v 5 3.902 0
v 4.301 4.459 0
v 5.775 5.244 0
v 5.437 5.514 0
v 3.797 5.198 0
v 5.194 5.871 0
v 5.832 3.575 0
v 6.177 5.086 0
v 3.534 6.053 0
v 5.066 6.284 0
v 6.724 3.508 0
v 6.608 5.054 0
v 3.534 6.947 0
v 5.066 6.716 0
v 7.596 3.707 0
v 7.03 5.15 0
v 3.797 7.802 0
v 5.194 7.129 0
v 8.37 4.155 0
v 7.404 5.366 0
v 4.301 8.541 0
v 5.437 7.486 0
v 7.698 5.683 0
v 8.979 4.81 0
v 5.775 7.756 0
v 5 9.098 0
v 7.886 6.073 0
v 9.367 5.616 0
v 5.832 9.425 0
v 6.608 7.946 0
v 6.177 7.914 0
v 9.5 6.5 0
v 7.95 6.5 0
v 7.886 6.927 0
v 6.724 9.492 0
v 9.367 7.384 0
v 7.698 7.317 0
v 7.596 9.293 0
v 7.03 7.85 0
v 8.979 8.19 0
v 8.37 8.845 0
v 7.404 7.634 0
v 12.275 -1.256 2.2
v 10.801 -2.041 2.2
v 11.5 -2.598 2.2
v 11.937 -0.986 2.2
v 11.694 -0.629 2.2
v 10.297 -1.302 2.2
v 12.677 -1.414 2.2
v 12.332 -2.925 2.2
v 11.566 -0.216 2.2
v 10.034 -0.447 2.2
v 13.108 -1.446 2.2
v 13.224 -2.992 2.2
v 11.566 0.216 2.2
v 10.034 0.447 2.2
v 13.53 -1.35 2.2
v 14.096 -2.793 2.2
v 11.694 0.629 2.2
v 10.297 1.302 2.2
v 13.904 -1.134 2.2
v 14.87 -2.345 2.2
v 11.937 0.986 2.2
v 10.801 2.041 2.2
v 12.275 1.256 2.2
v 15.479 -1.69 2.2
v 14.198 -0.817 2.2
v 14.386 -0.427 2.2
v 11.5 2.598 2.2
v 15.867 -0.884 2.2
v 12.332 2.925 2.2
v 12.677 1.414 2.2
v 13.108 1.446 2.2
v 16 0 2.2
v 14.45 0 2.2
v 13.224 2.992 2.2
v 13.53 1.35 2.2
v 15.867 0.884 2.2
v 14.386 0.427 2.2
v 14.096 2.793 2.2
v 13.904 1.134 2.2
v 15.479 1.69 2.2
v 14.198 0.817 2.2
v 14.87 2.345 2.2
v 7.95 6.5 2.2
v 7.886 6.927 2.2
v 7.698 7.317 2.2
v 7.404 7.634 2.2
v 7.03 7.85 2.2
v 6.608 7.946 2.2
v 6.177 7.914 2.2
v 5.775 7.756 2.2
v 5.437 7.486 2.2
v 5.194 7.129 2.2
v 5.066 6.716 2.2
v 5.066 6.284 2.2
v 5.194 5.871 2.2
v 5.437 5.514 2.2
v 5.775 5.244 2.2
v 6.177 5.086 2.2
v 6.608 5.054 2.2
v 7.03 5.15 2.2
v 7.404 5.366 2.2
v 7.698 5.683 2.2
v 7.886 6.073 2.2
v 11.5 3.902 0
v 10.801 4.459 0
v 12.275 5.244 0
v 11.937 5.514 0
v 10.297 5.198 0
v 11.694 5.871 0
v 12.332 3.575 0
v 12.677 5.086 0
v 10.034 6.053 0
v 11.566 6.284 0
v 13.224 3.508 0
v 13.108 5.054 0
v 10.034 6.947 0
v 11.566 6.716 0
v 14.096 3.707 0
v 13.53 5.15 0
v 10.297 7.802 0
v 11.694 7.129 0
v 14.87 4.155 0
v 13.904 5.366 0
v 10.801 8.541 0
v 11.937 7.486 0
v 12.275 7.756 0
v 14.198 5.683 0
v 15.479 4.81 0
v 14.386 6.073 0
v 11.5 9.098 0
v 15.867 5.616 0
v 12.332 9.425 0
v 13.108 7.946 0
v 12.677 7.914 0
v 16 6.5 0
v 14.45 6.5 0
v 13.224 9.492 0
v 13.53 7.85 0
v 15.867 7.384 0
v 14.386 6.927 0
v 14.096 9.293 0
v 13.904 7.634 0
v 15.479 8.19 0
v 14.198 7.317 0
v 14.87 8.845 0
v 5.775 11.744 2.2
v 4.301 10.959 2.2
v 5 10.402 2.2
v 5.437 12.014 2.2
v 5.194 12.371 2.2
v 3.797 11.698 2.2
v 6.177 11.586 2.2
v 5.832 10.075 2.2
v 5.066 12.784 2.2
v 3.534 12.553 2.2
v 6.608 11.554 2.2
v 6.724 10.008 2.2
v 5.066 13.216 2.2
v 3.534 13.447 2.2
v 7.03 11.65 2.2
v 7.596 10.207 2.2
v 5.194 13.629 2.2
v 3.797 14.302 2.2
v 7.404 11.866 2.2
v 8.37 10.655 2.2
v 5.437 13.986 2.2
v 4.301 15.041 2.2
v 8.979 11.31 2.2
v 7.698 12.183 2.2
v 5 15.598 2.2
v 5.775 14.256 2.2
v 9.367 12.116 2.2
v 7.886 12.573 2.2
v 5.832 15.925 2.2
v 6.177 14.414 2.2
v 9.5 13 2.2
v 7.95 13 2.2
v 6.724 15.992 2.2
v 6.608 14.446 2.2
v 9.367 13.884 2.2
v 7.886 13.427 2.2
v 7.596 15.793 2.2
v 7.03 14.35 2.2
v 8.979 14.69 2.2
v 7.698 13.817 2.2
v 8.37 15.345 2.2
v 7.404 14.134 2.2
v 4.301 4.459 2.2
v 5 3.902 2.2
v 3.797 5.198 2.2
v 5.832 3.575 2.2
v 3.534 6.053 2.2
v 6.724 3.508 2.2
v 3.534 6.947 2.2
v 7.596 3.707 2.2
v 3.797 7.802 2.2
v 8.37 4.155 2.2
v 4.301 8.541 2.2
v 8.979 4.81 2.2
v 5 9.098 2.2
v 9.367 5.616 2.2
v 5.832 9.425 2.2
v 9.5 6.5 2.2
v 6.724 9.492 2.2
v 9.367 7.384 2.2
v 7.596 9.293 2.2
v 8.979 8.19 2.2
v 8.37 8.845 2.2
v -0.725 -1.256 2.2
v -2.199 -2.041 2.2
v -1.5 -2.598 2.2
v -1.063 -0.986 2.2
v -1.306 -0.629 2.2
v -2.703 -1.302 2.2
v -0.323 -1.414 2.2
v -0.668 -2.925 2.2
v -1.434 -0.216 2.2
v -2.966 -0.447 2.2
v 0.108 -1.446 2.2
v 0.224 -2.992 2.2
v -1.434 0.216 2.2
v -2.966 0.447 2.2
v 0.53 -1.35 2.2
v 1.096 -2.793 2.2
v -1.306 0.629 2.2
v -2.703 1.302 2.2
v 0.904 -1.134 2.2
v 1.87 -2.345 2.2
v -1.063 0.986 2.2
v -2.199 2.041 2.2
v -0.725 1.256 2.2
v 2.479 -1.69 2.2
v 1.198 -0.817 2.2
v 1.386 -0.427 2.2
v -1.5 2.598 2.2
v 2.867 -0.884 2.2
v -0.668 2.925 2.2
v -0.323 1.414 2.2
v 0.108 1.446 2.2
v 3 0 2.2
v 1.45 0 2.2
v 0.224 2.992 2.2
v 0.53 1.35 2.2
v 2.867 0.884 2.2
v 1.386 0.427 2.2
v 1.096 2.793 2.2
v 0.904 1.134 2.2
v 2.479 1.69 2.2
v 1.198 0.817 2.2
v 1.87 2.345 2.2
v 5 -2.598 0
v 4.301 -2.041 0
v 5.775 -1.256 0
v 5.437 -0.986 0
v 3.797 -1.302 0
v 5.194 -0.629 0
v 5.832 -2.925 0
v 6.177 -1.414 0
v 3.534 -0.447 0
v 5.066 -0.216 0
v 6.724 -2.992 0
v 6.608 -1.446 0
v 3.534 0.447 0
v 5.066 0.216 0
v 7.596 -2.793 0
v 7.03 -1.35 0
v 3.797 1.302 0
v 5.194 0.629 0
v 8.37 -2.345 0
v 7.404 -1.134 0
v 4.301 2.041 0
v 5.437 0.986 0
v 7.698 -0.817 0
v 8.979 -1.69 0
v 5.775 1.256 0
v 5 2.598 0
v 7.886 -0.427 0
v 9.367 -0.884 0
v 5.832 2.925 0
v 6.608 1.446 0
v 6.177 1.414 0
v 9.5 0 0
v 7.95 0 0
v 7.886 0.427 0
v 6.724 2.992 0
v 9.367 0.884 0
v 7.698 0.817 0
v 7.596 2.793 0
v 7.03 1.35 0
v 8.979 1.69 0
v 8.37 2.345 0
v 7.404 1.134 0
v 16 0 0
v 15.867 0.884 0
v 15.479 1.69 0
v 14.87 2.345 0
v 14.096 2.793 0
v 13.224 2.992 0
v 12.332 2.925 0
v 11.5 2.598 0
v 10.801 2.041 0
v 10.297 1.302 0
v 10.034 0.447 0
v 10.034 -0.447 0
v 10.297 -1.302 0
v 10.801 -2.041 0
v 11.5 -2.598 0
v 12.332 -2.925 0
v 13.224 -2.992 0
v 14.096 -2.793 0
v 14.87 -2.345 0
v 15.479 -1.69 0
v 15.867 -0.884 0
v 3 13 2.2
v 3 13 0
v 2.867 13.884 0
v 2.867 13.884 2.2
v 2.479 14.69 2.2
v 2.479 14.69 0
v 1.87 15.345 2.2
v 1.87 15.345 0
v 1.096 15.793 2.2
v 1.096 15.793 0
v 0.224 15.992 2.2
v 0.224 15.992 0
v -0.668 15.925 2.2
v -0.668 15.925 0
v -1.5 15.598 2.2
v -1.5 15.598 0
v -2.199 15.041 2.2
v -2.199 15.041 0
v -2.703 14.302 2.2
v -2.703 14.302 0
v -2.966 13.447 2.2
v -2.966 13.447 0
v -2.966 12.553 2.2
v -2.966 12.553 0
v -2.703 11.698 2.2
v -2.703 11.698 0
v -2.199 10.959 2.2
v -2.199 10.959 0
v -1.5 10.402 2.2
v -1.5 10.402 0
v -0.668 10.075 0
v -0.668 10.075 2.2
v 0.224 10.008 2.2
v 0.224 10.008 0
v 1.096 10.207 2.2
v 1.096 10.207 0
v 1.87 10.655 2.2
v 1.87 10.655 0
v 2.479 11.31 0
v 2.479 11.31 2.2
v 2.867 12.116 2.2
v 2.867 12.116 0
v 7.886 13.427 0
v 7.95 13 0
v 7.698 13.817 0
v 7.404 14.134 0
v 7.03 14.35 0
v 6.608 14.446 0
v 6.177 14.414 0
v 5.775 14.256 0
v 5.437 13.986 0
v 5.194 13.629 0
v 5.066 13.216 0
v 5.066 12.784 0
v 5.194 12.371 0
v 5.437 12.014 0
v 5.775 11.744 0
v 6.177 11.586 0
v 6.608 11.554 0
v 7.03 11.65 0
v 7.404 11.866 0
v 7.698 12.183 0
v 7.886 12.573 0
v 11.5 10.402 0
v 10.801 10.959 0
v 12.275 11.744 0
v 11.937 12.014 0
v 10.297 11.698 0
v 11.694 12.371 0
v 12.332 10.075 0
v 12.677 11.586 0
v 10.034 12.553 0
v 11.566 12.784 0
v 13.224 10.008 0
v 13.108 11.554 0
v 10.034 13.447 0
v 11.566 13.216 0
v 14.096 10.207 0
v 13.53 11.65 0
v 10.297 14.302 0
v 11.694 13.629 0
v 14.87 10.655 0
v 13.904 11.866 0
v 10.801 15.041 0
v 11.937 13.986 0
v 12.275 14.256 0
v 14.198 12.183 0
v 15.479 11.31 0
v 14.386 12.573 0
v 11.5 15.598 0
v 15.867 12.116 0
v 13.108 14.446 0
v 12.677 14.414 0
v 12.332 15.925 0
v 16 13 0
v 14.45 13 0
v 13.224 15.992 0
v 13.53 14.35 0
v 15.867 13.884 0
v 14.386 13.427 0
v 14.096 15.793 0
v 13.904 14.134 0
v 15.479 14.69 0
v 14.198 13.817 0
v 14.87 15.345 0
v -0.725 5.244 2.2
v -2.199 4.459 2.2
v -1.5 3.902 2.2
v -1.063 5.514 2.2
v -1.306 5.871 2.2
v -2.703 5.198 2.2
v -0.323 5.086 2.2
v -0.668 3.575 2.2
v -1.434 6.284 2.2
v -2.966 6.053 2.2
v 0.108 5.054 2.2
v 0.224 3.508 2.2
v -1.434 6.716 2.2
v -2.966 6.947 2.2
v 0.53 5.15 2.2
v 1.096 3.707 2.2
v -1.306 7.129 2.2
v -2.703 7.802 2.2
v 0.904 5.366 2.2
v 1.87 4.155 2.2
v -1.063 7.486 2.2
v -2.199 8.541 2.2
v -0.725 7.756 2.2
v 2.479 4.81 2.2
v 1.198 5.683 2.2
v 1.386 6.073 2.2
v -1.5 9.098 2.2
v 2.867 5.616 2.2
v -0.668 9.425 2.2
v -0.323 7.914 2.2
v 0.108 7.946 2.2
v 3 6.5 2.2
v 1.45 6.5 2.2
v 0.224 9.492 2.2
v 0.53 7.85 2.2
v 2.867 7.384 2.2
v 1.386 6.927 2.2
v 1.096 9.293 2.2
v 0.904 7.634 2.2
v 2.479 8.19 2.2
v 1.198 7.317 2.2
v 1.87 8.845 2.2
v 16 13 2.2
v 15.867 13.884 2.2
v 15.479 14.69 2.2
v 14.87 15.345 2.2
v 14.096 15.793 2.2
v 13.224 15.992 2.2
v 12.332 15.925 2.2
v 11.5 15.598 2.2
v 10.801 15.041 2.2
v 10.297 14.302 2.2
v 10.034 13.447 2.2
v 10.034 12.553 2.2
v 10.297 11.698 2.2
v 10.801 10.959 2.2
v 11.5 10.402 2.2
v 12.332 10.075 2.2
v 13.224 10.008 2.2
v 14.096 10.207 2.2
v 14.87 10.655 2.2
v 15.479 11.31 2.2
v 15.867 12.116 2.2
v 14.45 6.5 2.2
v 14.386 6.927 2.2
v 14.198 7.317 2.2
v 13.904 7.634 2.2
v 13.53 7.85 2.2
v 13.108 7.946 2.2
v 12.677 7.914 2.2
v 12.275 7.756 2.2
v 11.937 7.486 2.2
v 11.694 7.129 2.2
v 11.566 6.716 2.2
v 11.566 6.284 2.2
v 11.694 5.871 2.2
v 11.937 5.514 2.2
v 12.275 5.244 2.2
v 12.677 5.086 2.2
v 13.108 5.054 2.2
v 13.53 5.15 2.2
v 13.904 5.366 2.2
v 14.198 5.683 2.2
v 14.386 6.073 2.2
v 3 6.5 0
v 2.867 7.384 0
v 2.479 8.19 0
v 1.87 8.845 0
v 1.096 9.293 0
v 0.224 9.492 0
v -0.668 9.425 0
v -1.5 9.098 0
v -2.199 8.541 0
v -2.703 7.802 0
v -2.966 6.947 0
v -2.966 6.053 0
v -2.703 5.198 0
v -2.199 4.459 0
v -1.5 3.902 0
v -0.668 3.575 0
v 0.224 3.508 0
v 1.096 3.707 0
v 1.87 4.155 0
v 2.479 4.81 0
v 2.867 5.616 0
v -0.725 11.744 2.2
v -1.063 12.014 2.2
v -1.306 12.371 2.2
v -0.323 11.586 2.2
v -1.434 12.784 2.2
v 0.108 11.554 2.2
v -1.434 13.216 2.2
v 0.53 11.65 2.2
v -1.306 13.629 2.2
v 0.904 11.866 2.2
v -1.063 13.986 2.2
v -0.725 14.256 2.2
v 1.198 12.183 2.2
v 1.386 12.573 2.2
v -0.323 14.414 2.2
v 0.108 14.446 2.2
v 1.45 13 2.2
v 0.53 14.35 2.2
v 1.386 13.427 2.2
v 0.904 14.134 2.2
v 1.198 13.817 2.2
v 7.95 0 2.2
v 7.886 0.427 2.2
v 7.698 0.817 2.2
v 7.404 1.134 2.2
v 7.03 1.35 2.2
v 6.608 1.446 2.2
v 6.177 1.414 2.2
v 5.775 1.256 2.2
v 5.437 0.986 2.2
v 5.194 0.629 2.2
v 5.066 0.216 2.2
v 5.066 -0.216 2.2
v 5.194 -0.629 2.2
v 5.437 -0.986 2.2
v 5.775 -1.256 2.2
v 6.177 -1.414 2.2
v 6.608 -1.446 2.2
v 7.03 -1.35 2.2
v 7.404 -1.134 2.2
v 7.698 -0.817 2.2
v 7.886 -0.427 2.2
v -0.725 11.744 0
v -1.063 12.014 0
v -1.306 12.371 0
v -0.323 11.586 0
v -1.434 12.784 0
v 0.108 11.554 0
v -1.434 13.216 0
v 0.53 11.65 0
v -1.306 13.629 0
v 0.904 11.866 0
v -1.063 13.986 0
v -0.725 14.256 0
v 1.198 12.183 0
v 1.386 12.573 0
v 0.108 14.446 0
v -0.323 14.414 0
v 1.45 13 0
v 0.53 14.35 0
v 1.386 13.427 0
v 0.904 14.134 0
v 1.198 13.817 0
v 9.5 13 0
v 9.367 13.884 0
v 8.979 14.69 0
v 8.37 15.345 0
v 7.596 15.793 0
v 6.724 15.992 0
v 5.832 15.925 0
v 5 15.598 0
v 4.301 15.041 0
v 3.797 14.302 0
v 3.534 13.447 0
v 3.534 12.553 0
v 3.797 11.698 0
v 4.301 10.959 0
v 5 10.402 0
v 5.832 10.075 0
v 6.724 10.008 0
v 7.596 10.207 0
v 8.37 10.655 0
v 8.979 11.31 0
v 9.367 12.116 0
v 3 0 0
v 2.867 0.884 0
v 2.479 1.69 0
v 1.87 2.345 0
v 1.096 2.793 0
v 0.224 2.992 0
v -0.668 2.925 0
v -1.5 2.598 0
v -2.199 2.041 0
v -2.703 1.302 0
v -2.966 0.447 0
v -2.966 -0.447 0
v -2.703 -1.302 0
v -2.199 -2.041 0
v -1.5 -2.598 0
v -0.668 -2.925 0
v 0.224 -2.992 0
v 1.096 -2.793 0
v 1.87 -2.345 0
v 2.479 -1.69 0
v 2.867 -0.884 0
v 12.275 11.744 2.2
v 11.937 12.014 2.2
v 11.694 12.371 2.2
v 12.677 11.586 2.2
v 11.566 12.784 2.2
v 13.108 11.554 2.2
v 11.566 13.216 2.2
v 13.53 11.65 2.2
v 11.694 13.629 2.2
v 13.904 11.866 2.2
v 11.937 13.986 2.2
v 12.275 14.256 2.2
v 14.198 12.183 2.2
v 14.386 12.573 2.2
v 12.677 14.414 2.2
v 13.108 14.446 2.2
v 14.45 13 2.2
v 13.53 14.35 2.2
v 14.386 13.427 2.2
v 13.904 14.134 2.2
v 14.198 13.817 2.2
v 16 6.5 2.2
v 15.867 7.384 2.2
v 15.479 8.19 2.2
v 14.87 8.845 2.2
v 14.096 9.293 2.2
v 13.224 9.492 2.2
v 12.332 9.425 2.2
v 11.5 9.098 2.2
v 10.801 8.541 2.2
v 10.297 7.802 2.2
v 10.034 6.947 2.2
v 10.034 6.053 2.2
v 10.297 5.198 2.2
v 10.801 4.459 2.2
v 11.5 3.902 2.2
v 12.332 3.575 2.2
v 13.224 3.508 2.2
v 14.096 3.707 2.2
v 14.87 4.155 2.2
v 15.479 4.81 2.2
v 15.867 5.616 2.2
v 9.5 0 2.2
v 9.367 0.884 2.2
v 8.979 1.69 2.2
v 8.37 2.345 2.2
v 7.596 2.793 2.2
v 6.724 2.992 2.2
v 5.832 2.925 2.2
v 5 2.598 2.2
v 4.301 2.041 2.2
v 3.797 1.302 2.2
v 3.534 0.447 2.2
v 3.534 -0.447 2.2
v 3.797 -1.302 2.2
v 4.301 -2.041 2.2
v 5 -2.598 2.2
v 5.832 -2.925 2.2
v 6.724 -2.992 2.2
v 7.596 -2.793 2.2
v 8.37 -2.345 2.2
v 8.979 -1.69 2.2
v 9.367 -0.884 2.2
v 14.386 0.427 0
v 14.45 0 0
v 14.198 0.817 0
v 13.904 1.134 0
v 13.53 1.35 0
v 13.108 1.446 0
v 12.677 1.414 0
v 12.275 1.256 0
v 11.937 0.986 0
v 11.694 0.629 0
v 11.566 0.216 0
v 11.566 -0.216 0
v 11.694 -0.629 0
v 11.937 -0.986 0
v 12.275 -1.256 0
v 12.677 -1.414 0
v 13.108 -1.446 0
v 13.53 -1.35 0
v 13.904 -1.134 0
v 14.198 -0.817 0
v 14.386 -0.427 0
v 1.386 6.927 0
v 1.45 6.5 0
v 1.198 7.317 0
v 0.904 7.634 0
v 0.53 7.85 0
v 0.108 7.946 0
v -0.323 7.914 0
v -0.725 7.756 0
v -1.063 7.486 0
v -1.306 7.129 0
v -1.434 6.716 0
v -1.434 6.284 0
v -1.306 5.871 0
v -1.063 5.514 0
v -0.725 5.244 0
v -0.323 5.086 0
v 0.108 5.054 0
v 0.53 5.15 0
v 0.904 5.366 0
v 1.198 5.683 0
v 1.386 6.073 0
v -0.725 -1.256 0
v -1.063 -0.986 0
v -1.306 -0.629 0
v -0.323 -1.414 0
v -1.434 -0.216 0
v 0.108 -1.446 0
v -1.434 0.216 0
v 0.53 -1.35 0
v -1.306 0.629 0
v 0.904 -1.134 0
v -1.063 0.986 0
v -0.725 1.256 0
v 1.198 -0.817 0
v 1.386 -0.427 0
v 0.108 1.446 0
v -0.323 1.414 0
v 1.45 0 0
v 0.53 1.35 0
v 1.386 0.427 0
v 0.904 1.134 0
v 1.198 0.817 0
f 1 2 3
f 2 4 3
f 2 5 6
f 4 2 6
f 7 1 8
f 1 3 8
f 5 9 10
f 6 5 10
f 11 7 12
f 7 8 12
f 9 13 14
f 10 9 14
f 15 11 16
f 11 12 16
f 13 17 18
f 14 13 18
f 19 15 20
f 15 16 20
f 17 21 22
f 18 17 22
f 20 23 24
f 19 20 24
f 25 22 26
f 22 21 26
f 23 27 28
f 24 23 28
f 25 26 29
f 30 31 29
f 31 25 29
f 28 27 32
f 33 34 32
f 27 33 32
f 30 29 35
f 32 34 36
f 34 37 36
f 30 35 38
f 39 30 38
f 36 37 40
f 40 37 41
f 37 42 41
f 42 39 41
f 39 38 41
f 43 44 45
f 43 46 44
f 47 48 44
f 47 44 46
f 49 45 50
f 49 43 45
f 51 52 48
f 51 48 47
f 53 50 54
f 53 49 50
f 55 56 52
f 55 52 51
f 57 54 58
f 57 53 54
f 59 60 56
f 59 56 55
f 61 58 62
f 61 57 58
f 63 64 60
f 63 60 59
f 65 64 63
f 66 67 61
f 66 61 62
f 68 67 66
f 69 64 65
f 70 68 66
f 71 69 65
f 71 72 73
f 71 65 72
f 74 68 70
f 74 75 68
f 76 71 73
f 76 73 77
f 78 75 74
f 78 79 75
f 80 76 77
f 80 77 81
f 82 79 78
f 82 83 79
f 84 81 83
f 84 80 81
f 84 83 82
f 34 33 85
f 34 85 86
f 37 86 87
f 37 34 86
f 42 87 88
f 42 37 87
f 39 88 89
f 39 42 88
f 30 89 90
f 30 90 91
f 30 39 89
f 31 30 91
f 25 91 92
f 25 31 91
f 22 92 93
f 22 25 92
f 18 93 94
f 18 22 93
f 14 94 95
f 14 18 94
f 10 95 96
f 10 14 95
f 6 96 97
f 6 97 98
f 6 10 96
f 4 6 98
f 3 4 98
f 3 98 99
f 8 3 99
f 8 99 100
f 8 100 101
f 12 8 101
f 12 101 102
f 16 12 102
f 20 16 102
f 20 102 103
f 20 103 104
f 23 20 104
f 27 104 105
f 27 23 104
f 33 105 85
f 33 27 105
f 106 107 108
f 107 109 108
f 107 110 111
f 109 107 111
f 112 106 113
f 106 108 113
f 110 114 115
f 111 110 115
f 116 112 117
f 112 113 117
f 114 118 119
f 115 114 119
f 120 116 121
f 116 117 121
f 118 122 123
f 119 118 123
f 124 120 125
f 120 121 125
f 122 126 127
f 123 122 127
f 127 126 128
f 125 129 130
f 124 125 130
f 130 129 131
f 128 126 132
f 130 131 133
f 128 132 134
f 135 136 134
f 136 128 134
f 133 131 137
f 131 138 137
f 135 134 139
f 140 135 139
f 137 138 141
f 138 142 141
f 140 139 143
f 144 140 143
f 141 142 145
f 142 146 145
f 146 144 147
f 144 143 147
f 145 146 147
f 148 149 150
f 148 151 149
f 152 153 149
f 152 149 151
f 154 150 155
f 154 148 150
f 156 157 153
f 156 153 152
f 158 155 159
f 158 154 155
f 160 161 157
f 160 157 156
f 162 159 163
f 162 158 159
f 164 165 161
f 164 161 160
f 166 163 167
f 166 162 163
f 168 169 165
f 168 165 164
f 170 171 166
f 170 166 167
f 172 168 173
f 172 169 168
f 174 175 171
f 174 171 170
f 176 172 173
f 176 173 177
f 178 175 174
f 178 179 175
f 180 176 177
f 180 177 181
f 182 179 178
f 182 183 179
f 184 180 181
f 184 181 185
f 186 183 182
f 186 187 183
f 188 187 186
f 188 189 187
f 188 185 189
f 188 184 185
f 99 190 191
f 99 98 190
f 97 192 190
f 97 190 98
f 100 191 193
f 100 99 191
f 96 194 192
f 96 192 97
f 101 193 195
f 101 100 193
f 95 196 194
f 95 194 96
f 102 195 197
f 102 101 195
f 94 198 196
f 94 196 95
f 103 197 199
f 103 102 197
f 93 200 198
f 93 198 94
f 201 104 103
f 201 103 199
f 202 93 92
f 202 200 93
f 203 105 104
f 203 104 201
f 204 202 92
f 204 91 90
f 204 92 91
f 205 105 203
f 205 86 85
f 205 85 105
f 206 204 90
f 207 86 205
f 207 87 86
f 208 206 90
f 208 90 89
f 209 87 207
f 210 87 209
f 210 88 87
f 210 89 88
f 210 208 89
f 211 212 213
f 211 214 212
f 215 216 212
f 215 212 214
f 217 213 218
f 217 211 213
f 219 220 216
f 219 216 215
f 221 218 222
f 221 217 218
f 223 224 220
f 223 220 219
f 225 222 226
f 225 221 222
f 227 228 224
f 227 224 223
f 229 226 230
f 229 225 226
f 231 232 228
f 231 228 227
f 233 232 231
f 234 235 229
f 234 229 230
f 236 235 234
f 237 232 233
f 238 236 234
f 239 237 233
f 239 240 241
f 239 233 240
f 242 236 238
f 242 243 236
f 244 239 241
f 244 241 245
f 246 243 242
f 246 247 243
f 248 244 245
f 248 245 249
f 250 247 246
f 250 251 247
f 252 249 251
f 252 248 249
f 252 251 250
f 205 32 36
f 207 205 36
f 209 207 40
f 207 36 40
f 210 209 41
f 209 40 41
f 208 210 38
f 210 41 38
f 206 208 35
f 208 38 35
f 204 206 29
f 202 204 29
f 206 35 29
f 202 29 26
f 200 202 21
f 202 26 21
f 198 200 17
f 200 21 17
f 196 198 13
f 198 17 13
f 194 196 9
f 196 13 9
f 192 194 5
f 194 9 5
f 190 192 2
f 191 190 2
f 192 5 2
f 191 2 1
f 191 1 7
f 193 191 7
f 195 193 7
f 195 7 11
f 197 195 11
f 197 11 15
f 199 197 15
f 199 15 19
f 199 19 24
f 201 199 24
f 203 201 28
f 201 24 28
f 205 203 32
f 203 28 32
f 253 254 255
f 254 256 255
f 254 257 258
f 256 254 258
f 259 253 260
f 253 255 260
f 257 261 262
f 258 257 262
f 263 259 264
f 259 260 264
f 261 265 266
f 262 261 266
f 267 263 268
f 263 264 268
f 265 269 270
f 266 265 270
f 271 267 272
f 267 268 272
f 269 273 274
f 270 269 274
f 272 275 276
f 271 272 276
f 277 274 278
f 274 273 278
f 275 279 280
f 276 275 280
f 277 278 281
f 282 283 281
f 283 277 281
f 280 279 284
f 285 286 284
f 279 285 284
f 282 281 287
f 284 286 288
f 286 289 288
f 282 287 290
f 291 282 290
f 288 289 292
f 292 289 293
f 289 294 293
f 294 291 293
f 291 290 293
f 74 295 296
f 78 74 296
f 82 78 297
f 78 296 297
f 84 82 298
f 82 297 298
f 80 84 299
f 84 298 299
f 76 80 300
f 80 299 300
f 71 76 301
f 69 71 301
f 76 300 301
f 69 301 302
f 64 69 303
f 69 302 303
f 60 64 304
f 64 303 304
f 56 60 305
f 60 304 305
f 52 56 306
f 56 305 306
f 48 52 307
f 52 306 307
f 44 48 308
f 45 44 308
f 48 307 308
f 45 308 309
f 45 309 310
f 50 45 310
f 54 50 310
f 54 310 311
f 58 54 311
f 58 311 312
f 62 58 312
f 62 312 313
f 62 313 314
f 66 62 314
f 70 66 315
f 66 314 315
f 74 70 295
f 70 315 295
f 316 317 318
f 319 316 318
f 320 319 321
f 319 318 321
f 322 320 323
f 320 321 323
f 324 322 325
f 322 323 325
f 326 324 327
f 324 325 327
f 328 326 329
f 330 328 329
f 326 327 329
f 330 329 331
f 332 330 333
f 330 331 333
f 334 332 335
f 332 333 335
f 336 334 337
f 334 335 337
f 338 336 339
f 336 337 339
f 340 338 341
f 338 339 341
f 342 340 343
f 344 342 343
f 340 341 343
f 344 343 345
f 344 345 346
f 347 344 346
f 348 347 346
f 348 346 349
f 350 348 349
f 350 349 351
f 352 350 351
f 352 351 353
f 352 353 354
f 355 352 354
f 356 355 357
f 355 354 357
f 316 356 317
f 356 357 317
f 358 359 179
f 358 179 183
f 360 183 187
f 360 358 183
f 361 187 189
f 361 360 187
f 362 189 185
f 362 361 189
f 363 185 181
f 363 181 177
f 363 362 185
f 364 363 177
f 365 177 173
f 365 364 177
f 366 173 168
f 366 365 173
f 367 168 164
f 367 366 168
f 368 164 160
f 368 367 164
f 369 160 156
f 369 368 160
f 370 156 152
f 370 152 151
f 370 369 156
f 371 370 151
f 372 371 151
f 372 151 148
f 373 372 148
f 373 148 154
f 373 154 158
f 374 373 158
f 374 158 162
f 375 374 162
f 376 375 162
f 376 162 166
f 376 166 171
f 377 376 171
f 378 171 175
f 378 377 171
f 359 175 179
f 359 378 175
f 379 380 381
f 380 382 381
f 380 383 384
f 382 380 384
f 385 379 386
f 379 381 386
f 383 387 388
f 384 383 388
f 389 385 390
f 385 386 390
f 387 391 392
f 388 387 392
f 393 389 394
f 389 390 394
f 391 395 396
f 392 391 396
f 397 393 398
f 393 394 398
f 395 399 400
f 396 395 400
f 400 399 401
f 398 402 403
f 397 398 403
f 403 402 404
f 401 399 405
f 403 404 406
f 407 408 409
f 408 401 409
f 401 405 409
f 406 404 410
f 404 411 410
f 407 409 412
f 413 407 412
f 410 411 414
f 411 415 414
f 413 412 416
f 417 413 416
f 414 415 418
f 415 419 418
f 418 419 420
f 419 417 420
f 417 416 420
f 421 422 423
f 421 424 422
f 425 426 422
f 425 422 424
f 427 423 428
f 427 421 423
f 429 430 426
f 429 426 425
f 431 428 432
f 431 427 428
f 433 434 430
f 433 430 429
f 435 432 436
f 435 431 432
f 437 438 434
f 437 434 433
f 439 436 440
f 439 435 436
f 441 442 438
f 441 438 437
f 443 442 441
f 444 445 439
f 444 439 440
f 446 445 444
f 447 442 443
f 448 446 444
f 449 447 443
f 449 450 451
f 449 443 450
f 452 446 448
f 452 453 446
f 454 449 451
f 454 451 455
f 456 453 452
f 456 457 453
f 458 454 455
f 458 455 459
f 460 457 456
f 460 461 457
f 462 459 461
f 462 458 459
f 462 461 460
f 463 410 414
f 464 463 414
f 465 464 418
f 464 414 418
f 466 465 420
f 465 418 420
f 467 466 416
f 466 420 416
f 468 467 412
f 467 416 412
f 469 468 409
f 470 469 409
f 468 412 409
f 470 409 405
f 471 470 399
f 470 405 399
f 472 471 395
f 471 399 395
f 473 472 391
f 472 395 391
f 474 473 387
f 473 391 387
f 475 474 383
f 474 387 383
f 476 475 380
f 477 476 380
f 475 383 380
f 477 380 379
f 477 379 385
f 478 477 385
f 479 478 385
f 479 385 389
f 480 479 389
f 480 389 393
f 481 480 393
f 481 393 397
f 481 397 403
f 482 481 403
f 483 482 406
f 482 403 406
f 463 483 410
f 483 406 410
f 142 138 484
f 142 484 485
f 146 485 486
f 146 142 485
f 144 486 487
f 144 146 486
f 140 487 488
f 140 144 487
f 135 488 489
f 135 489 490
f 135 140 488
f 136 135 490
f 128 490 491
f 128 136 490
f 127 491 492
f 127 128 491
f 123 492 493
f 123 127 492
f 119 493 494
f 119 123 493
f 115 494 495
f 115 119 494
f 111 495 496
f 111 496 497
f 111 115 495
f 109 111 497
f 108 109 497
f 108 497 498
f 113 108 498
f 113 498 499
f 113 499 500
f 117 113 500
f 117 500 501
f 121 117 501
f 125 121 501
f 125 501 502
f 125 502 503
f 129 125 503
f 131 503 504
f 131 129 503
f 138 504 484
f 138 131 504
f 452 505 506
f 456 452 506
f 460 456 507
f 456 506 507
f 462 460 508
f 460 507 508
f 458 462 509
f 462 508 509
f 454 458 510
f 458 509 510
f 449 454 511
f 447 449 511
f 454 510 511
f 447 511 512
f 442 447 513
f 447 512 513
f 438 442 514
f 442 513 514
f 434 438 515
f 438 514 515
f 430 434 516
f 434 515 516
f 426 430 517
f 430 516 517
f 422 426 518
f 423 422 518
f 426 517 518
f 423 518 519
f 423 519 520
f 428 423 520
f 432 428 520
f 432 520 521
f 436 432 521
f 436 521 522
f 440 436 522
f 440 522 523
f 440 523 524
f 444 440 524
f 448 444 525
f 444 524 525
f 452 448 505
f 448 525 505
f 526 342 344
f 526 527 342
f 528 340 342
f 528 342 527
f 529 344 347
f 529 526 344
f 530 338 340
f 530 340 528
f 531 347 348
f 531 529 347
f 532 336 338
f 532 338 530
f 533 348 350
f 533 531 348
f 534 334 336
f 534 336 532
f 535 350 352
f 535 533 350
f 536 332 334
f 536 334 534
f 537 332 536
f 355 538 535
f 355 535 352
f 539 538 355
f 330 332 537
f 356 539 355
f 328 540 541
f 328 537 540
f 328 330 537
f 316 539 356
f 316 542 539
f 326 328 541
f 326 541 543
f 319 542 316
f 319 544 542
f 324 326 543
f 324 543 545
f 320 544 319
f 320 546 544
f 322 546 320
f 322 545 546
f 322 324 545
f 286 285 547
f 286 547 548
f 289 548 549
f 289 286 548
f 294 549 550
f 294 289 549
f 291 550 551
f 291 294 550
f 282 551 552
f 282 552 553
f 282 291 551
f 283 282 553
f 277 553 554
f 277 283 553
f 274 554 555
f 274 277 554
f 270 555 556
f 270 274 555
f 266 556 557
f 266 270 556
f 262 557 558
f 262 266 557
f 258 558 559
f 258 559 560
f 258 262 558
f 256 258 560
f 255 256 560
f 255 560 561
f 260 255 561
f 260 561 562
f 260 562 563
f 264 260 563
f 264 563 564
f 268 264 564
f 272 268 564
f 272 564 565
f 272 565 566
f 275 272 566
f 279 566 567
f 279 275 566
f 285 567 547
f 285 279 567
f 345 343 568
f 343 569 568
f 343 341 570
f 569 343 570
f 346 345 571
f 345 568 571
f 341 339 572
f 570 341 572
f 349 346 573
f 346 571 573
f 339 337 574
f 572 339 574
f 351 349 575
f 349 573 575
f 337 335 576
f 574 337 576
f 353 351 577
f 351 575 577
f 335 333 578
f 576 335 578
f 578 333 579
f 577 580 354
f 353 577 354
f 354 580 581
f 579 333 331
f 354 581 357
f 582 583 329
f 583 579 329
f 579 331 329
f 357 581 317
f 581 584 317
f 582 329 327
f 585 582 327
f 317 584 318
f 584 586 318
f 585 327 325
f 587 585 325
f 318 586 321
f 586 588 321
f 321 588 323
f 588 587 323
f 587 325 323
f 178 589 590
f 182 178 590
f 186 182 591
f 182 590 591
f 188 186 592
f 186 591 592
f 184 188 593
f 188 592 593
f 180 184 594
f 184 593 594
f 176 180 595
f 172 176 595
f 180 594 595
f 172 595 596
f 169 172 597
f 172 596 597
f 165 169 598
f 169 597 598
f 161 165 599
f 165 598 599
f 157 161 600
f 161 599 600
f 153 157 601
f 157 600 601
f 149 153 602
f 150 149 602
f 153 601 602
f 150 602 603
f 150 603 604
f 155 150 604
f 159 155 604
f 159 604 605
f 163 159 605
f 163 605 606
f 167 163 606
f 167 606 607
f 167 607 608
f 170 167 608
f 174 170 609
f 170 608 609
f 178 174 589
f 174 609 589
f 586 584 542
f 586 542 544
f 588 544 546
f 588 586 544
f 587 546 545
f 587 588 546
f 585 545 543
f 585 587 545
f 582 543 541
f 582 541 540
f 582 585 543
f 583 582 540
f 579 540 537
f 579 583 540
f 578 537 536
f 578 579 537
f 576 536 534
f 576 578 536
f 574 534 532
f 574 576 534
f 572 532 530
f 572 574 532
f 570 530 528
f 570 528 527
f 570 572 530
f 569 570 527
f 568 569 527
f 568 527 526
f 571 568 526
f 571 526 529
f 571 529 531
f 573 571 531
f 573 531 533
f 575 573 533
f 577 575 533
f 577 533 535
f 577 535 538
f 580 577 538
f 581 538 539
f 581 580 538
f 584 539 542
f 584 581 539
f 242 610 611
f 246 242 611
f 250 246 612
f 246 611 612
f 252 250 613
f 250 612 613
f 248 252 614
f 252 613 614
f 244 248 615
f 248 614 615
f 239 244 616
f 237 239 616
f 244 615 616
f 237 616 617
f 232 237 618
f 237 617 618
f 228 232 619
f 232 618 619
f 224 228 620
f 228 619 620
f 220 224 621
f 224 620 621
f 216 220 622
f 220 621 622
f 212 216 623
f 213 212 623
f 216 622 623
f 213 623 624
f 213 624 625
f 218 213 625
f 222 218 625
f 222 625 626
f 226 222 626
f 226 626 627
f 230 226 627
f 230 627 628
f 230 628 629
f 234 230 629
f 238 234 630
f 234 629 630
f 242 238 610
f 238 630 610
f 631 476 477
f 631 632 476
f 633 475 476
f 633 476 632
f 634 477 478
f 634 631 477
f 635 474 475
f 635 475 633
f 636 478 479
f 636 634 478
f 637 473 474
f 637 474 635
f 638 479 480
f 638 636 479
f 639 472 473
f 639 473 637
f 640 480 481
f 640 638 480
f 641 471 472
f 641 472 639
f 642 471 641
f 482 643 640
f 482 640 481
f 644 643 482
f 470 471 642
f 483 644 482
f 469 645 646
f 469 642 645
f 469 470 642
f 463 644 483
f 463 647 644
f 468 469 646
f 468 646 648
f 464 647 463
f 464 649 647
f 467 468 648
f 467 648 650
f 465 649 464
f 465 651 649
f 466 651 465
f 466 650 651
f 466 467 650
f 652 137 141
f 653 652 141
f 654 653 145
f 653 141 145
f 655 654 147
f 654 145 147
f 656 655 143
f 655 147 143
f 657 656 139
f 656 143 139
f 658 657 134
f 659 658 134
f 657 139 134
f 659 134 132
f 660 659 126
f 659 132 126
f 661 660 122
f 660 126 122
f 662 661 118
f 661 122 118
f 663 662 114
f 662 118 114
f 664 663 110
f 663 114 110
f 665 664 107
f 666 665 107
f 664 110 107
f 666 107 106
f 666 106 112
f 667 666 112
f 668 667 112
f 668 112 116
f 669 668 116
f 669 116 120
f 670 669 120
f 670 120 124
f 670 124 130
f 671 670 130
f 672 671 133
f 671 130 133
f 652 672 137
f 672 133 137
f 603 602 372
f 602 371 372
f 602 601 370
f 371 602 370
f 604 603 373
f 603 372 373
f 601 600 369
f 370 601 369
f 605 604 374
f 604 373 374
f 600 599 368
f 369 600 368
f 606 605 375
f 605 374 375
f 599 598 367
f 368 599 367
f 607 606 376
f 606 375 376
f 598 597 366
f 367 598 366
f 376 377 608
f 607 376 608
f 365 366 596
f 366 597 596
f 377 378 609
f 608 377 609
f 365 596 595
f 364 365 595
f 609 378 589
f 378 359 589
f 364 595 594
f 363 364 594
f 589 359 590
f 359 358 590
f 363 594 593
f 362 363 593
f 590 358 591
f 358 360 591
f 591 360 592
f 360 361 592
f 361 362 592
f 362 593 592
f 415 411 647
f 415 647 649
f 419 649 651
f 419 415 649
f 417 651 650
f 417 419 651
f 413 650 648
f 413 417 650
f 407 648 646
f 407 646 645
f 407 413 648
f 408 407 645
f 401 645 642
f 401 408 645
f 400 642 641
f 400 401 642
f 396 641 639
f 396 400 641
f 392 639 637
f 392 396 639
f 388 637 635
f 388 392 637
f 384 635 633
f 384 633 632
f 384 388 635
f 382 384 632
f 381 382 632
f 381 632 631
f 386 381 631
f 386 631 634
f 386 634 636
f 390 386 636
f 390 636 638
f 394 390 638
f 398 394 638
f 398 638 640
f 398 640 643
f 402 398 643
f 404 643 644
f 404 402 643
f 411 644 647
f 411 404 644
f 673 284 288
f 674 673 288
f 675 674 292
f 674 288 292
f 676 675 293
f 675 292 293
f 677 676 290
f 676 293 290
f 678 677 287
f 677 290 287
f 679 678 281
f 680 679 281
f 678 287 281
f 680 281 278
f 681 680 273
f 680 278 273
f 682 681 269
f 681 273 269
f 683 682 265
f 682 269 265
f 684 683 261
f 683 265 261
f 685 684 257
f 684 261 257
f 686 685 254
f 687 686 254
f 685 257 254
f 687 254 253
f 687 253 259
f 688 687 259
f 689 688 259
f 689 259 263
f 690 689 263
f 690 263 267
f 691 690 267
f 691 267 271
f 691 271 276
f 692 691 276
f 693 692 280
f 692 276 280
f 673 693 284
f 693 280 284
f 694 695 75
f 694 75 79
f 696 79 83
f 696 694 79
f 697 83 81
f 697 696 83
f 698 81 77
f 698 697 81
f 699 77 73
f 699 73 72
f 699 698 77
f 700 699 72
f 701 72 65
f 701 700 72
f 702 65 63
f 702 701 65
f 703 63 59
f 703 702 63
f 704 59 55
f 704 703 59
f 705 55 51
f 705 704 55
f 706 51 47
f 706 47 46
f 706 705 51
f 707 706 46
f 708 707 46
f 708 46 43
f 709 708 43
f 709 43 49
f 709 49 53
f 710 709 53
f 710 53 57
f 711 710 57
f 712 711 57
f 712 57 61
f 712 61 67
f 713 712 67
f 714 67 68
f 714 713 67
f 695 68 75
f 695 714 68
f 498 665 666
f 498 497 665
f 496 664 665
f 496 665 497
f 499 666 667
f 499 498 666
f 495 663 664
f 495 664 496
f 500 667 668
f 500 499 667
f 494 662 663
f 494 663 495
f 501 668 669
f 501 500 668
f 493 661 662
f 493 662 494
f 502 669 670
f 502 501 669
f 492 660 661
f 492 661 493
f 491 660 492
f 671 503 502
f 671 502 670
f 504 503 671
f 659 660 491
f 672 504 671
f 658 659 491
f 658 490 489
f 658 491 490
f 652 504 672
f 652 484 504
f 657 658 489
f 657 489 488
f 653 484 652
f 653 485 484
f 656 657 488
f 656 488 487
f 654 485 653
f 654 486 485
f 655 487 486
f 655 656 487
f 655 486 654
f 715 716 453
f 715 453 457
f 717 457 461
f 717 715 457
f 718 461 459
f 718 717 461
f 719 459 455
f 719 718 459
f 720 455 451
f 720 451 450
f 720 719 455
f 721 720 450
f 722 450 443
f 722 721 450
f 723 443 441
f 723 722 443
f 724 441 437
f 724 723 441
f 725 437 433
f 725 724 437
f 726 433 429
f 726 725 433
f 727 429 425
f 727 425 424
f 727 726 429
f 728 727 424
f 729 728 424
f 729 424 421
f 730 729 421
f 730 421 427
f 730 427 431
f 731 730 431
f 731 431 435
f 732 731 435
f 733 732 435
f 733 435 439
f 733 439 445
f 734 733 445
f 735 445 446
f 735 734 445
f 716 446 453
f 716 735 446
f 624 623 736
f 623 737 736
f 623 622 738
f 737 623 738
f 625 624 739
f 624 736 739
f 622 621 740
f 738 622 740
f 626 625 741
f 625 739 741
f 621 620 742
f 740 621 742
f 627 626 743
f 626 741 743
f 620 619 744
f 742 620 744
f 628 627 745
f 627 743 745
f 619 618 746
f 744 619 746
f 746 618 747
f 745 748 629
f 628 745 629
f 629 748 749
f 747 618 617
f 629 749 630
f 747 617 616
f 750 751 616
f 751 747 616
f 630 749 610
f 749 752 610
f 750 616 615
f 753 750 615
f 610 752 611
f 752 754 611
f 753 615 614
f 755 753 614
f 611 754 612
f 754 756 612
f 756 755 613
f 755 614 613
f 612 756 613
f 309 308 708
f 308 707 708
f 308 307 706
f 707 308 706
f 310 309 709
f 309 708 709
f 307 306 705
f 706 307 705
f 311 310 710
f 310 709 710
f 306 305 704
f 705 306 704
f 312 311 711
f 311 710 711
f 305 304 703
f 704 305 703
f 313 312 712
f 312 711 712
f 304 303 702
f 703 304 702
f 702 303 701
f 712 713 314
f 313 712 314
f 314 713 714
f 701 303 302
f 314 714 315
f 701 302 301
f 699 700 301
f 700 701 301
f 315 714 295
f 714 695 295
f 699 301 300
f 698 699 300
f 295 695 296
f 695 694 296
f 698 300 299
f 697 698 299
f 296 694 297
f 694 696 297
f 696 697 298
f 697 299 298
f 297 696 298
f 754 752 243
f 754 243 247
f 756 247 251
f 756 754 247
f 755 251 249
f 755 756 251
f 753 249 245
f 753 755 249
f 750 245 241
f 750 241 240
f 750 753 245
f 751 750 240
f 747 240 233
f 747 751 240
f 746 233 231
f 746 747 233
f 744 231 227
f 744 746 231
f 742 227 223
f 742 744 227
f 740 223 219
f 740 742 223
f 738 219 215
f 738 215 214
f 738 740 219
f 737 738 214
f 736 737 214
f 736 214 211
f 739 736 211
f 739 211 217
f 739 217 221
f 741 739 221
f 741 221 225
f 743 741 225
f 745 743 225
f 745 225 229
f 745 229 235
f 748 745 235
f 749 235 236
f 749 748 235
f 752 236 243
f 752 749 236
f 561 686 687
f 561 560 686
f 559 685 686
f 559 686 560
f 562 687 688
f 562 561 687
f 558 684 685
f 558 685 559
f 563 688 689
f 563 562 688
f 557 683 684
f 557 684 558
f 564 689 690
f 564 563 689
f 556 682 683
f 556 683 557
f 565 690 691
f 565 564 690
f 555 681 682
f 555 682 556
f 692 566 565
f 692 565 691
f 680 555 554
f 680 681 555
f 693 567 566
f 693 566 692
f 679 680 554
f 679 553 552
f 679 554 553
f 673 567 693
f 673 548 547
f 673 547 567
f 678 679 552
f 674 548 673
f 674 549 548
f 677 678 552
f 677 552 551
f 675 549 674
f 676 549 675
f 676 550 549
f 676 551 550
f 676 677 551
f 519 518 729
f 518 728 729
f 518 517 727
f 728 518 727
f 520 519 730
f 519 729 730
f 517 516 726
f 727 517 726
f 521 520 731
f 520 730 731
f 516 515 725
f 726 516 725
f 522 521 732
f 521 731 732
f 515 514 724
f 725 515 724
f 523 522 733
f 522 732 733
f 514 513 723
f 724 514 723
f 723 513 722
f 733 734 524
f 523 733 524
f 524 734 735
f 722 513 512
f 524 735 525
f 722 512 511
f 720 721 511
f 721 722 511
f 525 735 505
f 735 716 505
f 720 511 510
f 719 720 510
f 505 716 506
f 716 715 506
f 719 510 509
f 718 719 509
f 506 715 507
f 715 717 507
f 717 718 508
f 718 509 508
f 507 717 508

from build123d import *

# Parameters (mm, degrees)
F0_R     = 3
F0_R_2   = 1.45
F1_DEPTH = 2.2


with BuildPart() as f1:
    # F0 (on Top) → F1 (new body)
    with BuildSketch(Plane.XY):
        with Locations((13, 13)):
            Circle(F0_R)
        with Locations((13, 13)):
            Circle(F0_R_2, mode=Mode.SUBTRACT)
        with Locations((6.5, 13)):
            Circle(F0_R)
        with Locations((6.5, 13)):
            Circle(F0_R_2, mode=Mode.SUBTRACT)
        with Locations((0, 13)):
            Circle(F0_R)
        with Locations((0, 13)):
            Circle(F0_R_2, mode=Mode.SUBTRACT)
        with Locations((0, 6.5)):
            Circle(F0_R)
        with Locations((0, 6.5)):
            Circle(F0_R_2, mode=Mode.SUBTRACT)
        with Locations((6.5, 6.5)):
            Circle(F0_R)
        with Locations((6.5, 6.5)):
            Circle(F0_R_2, mode=Mode.SUBTRACT)
        with Locations((13, 6.5)):
            Circle(F0_R)
        with Locations((13, 6.5)):
            Circle(F0_R_2, mode=Mode.SUBTRACT)
        with Locations((13, 0)):
            Circle(F0_R)
        with Locations((13, 0)):
            Circle(F0_R_2, mode=Mode.SUBTRACT)
        with Locations((6.5, 0)):
            Circle(F0_R)
        with Locations((6.5, 0)):
            Circle(F0_R_2, mode=Mode.SUBTRACT)
        Circle(F0_R)
        Circle(F0_R_2, mode=Mode.SUBTRACT)
    extrude(amount=F1_DEPTH)


solid = f1.part
